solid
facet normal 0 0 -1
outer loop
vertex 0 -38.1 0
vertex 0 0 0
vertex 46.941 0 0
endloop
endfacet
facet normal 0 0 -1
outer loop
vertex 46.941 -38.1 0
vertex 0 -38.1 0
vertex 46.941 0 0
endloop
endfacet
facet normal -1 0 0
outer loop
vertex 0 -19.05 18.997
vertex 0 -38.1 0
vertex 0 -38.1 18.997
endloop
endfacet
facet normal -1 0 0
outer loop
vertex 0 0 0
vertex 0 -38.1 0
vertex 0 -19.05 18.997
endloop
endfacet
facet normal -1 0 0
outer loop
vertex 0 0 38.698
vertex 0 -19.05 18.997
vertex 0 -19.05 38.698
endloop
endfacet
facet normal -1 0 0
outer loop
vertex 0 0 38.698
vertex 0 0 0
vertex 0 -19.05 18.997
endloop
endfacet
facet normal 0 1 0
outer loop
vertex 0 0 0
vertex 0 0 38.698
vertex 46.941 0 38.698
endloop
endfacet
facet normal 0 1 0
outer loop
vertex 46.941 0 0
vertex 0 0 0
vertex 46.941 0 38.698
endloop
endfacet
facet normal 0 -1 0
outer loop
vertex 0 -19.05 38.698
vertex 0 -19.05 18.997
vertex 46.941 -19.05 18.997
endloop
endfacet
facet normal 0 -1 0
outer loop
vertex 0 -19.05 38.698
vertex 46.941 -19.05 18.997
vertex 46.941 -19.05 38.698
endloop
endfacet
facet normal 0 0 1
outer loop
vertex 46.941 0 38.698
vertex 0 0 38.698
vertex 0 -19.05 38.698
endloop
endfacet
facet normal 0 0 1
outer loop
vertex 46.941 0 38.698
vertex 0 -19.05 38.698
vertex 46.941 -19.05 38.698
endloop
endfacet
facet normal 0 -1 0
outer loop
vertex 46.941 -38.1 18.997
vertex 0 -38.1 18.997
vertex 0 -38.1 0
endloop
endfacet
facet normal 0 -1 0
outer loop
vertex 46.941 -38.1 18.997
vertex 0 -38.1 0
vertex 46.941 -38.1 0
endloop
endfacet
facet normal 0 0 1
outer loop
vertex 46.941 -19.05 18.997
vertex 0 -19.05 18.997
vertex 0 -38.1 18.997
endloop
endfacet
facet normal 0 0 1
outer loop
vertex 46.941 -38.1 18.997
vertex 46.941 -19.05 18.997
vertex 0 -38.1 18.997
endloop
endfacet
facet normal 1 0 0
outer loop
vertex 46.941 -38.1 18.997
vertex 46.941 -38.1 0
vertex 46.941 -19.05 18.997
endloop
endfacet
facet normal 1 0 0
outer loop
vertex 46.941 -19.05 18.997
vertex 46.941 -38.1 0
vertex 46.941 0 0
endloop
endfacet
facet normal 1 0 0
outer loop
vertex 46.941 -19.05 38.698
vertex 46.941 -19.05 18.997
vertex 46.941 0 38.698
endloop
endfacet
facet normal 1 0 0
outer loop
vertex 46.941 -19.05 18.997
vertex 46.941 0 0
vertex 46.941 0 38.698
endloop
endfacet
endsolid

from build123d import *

# Parameters (mm, degrees)
F0_W     = 46.9405390322
F0_H     = 38.6983044446
F1_DEPTH = 38.1
F3_W     = 19.05
F3_H     = 19.7009555995
F4_DEPTH = 25.4
F5_DEPTH = 50.8


with BuildPart() as f1:
    # F0 (on Front) → F1 (new body)
    with BuildSketch(Plane.XZ):
        with Locations((23.4702695161, 19.3491522223)):
            Rectangle(F0_W, F0_H)
    extrude(amount=F1_DEPTH)

    # F3 (on face) → F4 (cut)
    with BuildSketch(Plane(origin=(0, 0, 0), x_dir=(0, -1, 0), z_dir=(-1, 0, 0))):
        with Locations((28.575, 28.8478266448)):
            Rectangle(F3_W, F3_H)
    extrude(amount=-F4_DEPTH, mode=Mode.SUBTRACT)

    # F5 (cut): a face of the model
    f5_faces = [f1.faces().sort_by_distance(p)[0] for p in [
        (25.4, -28.575, 28.8478266448),
    ]]
    extrude(f5_faces, amount=-F5_DEPTH, mode=Mode.SUBTRACT)


solid = f1.part
